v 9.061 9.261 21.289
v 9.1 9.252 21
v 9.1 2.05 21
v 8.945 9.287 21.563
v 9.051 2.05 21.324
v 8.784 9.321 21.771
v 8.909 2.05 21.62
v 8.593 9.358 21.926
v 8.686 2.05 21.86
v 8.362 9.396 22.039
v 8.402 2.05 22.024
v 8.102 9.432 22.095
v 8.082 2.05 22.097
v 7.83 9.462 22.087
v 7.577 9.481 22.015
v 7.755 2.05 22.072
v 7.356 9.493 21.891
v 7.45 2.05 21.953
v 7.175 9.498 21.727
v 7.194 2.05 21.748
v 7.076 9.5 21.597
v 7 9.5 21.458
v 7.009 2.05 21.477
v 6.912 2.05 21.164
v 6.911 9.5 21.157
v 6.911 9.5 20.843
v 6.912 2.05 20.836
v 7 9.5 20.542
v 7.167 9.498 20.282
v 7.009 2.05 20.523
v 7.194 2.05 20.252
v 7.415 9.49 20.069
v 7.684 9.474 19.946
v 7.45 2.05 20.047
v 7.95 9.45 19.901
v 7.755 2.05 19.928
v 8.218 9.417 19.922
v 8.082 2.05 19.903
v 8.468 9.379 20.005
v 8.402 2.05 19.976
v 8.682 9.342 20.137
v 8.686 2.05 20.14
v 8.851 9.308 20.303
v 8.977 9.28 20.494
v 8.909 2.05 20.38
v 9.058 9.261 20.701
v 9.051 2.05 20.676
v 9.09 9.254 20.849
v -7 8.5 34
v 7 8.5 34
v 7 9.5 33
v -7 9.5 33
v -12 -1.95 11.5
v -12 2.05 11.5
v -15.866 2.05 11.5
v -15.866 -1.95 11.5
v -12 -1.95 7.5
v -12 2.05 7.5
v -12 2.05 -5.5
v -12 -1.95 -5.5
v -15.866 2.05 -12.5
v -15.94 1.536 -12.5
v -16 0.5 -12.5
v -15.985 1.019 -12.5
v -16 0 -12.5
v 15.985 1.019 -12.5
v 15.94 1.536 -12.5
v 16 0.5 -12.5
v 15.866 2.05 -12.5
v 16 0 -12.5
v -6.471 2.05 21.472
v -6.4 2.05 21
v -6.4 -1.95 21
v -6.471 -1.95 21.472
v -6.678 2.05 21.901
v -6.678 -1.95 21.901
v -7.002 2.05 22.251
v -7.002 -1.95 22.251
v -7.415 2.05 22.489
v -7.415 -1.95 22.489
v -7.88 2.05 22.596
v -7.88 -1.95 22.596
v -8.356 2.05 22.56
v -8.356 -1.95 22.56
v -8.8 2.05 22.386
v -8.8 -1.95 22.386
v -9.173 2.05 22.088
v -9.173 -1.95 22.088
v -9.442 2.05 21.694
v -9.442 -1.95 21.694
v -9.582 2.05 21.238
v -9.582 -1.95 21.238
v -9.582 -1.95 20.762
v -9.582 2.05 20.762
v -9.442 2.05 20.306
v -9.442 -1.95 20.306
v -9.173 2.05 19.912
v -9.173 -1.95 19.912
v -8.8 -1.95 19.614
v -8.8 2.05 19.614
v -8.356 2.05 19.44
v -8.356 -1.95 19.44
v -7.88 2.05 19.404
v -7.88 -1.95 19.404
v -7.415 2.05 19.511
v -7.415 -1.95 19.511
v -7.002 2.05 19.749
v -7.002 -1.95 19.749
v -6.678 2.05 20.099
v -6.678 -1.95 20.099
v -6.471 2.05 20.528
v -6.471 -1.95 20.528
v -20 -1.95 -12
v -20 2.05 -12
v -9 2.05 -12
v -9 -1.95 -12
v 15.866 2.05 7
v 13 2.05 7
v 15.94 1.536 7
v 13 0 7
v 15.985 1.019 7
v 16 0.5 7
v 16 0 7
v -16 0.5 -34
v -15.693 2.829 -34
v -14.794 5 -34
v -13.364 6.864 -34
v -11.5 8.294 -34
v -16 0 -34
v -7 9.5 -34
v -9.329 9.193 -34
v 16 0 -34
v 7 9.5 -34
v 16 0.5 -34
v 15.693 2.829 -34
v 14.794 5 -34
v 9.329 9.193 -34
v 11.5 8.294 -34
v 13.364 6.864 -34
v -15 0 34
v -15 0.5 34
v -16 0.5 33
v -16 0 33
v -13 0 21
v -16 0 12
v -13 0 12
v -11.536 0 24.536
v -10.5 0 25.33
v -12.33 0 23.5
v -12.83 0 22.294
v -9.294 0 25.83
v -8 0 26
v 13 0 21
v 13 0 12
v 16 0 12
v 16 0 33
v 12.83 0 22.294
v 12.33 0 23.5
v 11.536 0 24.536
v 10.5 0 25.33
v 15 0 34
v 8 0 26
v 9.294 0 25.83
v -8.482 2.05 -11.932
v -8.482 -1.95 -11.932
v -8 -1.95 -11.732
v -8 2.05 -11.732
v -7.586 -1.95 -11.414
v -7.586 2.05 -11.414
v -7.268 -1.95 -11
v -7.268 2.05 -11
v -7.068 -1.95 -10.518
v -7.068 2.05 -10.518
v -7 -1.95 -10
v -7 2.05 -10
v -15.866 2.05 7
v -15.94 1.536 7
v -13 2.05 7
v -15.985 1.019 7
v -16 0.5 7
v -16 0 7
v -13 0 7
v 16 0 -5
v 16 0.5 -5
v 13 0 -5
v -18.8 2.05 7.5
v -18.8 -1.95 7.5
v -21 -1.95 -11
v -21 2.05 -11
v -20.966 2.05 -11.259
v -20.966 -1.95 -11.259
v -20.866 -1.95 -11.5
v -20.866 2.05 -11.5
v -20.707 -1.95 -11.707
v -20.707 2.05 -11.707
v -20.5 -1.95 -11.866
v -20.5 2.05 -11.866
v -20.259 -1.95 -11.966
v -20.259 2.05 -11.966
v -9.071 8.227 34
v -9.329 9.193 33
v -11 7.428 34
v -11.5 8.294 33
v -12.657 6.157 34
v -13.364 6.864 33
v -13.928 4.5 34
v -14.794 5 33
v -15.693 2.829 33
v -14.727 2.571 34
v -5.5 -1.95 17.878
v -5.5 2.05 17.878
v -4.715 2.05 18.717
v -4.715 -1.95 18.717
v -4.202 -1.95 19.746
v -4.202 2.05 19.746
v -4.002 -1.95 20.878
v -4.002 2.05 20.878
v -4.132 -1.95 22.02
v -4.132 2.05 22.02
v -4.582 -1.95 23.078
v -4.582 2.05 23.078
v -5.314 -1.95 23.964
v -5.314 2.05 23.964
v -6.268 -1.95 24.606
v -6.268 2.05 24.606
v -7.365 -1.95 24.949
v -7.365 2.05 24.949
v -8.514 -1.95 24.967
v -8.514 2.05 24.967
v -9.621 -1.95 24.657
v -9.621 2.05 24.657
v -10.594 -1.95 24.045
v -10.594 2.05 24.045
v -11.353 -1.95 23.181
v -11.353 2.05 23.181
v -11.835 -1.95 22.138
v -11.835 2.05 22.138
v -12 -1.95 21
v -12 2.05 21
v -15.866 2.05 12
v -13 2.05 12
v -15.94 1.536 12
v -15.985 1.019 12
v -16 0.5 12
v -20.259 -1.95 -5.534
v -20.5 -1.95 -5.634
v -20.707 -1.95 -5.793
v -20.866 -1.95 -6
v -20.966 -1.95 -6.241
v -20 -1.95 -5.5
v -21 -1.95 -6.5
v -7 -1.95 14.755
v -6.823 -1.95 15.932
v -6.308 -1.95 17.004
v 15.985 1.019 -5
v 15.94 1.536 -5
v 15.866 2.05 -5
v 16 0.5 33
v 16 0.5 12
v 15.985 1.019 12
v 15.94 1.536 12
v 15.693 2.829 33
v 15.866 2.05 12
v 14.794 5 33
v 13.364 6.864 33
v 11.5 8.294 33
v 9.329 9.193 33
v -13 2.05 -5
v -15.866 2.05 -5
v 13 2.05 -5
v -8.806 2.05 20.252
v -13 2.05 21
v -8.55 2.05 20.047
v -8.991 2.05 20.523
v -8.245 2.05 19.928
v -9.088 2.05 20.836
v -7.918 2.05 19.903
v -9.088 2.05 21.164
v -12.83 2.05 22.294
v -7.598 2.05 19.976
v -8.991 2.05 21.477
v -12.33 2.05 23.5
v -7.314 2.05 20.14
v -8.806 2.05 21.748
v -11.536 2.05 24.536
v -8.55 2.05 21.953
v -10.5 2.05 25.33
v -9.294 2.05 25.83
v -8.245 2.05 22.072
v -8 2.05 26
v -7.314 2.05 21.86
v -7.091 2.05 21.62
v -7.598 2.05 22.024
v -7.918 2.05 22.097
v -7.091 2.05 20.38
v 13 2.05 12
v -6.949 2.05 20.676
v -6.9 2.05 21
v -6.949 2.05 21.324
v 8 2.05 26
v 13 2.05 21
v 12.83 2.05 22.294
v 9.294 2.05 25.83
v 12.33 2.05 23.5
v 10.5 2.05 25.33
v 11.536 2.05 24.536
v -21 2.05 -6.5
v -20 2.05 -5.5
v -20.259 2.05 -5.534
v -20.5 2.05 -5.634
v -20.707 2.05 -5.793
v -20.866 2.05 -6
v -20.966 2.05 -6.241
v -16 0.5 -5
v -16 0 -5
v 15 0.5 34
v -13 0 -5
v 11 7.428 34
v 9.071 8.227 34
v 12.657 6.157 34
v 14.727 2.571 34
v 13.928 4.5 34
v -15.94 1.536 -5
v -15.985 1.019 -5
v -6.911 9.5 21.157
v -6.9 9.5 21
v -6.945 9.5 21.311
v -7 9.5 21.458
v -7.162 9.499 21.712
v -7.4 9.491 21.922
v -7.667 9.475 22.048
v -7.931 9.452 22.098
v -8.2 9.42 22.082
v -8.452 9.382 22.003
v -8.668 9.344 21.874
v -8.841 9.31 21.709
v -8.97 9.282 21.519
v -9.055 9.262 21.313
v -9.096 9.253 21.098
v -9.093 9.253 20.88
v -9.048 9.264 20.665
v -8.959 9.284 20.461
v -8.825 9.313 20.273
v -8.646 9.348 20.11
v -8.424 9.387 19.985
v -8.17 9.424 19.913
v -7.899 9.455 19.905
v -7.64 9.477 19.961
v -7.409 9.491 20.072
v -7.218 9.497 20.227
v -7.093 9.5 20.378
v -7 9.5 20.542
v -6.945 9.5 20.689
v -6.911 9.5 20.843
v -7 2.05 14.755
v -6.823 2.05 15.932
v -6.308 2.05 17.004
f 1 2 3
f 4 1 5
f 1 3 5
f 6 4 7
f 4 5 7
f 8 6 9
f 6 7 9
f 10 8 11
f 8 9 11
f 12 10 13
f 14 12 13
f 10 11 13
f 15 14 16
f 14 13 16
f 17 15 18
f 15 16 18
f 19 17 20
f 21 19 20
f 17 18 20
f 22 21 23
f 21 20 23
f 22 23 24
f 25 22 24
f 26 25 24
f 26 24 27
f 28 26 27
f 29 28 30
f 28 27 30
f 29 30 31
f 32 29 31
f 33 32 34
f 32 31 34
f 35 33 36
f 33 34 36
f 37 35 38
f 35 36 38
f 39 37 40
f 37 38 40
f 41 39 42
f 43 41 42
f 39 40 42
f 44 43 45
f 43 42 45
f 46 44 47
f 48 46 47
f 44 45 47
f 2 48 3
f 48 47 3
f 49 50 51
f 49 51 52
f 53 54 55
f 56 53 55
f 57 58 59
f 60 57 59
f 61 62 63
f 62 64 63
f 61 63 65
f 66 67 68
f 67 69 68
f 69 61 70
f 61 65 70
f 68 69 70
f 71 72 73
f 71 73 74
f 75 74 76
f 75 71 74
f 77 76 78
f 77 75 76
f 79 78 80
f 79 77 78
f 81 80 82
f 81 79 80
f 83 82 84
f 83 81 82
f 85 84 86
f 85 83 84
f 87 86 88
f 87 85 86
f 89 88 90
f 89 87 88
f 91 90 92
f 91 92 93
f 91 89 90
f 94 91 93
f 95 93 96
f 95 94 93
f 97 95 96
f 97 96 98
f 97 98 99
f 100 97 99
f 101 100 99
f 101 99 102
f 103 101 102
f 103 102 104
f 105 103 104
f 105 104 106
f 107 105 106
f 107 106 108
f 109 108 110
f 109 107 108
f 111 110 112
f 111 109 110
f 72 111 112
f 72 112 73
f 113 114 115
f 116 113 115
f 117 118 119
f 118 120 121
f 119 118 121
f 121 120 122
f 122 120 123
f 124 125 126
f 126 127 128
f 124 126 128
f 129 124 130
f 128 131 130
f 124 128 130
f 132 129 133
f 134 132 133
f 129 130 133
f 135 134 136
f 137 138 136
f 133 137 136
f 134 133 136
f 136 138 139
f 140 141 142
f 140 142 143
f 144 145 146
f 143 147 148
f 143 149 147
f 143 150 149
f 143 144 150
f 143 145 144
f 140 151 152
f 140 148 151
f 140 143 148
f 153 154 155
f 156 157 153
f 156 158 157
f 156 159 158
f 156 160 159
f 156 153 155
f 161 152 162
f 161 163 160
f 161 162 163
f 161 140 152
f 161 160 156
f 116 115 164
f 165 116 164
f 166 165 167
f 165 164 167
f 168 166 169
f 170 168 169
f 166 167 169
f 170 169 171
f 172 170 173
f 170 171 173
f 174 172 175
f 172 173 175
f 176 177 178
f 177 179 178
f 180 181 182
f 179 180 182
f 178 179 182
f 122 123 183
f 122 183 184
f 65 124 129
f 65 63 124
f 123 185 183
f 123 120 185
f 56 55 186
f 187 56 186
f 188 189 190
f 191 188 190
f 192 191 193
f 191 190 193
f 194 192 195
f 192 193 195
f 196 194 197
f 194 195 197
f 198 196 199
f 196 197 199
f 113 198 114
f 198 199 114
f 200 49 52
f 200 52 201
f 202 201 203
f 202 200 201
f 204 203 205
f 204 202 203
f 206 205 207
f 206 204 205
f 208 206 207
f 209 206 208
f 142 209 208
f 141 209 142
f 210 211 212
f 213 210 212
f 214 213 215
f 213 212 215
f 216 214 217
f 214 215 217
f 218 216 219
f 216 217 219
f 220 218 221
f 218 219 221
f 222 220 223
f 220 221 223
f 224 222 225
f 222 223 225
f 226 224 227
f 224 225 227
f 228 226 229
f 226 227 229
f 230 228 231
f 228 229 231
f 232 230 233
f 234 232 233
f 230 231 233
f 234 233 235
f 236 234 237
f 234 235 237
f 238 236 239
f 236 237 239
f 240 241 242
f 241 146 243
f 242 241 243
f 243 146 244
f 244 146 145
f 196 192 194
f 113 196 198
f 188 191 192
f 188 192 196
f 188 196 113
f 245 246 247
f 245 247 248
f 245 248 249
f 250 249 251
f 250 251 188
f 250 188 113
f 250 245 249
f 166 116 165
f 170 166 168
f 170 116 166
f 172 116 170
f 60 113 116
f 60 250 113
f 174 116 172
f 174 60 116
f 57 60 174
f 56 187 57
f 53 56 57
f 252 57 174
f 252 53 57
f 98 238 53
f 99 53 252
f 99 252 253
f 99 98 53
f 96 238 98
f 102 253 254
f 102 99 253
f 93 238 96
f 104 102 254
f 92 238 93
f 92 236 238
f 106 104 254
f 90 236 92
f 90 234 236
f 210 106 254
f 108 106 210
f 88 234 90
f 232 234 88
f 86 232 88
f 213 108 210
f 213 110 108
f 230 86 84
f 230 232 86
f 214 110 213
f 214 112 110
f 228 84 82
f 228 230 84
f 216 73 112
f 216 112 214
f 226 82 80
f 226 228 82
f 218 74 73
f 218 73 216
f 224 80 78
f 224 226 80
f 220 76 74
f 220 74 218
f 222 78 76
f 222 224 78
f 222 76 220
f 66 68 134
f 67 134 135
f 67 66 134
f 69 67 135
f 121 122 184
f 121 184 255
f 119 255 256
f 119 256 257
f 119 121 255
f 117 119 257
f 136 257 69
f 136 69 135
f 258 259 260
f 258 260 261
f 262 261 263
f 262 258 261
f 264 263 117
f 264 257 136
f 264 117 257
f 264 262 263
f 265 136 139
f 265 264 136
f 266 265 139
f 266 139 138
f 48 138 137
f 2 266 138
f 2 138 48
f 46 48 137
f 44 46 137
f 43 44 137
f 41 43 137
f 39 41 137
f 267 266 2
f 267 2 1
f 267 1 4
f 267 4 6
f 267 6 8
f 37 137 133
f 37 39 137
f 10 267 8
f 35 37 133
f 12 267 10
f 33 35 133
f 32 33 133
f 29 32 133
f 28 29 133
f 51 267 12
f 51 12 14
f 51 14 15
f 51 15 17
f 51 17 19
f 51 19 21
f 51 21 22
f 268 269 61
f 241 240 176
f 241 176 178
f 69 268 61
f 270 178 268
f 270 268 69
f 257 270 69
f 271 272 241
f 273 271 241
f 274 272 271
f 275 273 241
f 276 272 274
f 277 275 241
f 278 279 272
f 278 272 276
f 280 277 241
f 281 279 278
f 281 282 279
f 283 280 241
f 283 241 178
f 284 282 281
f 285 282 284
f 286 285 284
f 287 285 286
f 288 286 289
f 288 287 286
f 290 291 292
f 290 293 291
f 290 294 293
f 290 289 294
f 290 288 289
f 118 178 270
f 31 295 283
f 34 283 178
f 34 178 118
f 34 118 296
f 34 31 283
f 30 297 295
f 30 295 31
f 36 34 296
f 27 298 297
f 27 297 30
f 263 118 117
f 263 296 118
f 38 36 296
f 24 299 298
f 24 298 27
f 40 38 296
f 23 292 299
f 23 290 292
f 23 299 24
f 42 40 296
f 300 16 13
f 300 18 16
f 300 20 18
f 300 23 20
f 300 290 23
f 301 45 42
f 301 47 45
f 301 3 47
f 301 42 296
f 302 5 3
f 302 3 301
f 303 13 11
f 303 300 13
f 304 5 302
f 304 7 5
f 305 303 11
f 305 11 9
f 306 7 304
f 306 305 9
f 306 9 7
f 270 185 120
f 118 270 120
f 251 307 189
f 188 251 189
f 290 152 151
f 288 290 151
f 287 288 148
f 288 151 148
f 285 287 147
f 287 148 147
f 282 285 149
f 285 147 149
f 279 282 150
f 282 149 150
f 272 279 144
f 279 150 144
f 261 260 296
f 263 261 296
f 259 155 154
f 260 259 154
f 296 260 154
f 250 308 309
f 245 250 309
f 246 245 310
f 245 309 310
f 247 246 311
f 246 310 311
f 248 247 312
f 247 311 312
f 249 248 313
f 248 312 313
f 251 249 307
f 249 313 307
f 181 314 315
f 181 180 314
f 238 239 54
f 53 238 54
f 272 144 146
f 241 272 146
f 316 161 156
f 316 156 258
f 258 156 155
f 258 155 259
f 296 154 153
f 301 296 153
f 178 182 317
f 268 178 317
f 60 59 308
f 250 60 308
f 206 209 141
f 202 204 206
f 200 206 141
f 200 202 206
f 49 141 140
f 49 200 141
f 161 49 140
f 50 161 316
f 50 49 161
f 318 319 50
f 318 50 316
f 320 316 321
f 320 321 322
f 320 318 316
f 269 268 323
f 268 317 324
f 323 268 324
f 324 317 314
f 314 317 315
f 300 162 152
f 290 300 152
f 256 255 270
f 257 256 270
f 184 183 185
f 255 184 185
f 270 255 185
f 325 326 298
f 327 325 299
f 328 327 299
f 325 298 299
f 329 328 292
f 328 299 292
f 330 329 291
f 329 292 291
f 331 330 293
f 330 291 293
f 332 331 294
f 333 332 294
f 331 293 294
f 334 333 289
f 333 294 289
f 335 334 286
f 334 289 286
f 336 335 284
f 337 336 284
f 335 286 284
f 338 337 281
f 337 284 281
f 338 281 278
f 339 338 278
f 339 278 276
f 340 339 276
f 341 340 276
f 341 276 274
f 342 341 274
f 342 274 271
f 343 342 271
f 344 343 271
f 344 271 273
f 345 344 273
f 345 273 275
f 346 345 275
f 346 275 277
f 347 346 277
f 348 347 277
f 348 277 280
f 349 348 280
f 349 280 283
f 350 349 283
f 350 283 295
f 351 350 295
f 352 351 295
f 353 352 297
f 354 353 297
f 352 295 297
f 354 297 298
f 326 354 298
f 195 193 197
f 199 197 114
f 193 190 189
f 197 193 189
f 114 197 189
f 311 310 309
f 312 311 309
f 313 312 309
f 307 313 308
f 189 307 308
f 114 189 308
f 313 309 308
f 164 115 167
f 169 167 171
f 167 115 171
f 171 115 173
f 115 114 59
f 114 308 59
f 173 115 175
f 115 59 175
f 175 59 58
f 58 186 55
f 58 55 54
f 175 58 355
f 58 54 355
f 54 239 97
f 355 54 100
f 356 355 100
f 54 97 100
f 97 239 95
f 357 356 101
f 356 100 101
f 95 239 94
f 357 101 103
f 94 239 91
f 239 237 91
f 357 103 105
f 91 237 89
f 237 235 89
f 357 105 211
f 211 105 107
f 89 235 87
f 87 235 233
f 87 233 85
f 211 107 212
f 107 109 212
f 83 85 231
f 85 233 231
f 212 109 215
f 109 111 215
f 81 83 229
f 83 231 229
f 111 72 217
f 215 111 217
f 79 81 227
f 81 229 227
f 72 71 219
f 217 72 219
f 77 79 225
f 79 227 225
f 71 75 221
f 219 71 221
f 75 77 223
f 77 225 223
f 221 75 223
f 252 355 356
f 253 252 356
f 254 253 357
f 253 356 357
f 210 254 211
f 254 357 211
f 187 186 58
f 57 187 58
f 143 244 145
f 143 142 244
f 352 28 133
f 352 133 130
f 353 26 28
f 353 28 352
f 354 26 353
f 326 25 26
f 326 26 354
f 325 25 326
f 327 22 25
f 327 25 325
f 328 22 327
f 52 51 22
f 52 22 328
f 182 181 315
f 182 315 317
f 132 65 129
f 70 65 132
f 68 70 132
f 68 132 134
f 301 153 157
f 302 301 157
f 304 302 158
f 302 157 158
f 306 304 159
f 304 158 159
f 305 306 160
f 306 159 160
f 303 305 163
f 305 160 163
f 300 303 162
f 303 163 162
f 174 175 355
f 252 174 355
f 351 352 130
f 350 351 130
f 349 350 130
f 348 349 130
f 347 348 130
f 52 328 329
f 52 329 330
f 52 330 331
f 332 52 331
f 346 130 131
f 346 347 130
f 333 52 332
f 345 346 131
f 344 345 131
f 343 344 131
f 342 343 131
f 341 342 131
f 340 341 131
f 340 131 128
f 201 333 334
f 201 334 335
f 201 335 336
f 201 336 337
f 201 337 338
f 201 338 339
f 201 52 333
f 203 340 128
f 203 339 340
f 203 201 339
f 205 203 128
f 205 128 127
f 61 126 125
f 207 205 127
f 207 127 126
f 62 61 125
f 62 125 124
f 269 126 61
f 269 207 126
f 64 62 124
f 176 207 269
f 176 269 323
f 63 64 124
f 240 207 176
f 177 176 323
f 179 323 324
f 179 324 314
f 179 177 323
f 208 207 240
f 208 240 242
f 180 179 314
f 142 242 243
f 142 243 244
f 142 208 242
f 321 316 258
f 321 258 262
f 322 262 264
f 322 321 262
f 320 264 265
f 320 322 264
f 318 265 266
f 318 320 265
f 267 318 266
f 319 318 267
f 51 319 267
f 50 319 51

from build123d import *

# Parameters (mm, degrees)
F1_DEPTH = 34
F2_SIZE  = 1
F3_W     = 74.736379
F3_H     = 20.344906
F4_DEPTH = 35
F5_R     = 1.1
F6_DEPTH = 2.05
F7_DEPTH = 25
F8_R     = 1.6
F9_DEPTH = 4


with BuildPart() as f1:
    # F0 (on Top) → F1 (new body, symmetric)
    with BuildSketch(Plane.XY):
        with BuildLine():
            Line((-7, -9.5), (7, -9.5))
            ThreePointArc((7, -9.5), (13.363961, -6.863961), (16, -0.5))
            Line((16, -0.5), (16, 0.5))
            ThreePointArc((16, 0.5), (13.363961, 6.863961), (7, 9.5))
            Line((7, 9.5), (-7, 9.5))
            ThreePointArc((-7, 9.5), (-13.363961, 6.863961), (-16, 0.5))
            Line((-16, 0.5), (-16, -0.5))
            ThreePointArc((-16, -0.5), (-13.363961, -6.863961), (-7, -9.5))
        make_face()
    extrude(amount=F1_DEPTH, both=True)

    # F2
    f2_edges = [f1.edges().sort_by_distance(p)[0] for p in [
        (0, -9.5, 34),
        (13.363961, -6.863961, 34),
        (16, 0, 34),
        (13.363961, 6.863961, 34),
        (0, 9.5, 34),
        (-13.363961, 6.863961, 34),
        (-16, 0, 34),
        (-13.363961, -6.863961, 34),
    ]]
    chamfer(f2_edges, length=F2_SIZE)

    # F3 (on Top) → F4 (cut, symmetric)
    with BuildSketch(Plane.XY):
        with Locations((1.93761, -10.172453)):
            Rectangle(F3_W, F3_H)
    extrude(amount=F4_DEPTH, both=True, mode=Mode.SUBTRACT)

    # F5 (on Front) → F6 (cut)
    with BuildSketch(Plane.XZ):
        with BuildLine():
            ThreePointArc((13, 21), (11.535534, 24.535534), (8, 26))
            Line((8, 26), (-8, 26))
            ThreePointArc((-8, 26), (-11.535534, 24.535534), (-13, 21))
            Line((-13, 21), (-13, 12))
            Line((-13, 12), (-30, 12))
            Line((-30, 12), (-30, 7))
            Line((-30, 7), (-13, 7))
            Line((-13, 7), (-13, -5))
            Line((-13, -5), (-20.453356, -5))
            Line((-20.453356, -5), (-20.453356, -12.5))
            Line((-20.453356, -12.5), (19.970084, -12.5))
            Line((19.970084, -12.5), (19.970084, -5))
            Line((19.970084, -5), (13, -5))
            Line((13, -5), (13, 7))
            Line((13, 7), (30, 7))
            Line((30, 7), (30, 12))
            Line((30, 12), (13, 12))
            Line((13, 12), (13, 21))
        make_face()
        with Locations((-8, 21)):
            Circle(F5_R, mode=Mode.SUBTRACT)
        with Locations((8, 21)):
            Circle(F5_R, mode=Mode.SUBTRACT)
        with Locations((-8, 21)):
            Circle(F5_R)
        with Locations((8, 21)):
            Circle(F5_R)
    extrude(amount=-F6_DEPTH, mode=Mode.SUBTRACT)

    # F5 (on Front) → F7 (cut)
    with BuildSketch(Plane.XZ):
        with Locations((-8, 21)):
            Circle(F5_R)
        with Locations((8, 21)):
            Circle(F5_R)
    extrude(amount=-F7_DEPTH, mode=Mode.SUBTRACT)


with BuildPart() as f9:
    # F8 (on face) → F9 (new body)
    with BuildSketch(Plane.XZ.offset(-2.05)):
        with BuildLine():
            Line((-12, 11.5), (-15.865523, 11.5))
            Line((-15.865523, 11.5), (-18.8, 7.5))
            Line((-18.8, 7.5), (-12, 7.5))
            Line((-12, 7.5), (-12, -5.5))
            Line((-12, -5.5), (-20, -5.5))
            ThreePointArc((-20, -5.5), (-20.707107, -5.792893), (-21, -6.5))
            Line((-21, -6.5), (-21, -11))
            ThreePointArc((-21, -11), (-20.707107, -11.707107), (-20, -12))
            Line((-20, -12), (-9, -12))
            ThreePointArc((-9, -12), (-7.585786, -11.414214), (-7, -10))
            Line((-7, -10), (-7, -1))
            Line((-7, -1), (-7, 1))
            Line((-7, 1), (-7, 14.755002))
            ThreePointArc((-7, 14.755002), (-6.605551, 16.487053), (-5.5, 17.877501))
            ThreePointArc((-5.5, 17.877501), (-6.267949, 24.605551), (-12, 21))
            Line((-12, 21), (-12, 11.5))
        make_face()
        with Locations((-8, 21)):
            Circle(F8_R, mode=Mode.SUBTRACT)
    extrude(amount=F9_DEPTH)


solid = Compound([f1.part, f9.part])
